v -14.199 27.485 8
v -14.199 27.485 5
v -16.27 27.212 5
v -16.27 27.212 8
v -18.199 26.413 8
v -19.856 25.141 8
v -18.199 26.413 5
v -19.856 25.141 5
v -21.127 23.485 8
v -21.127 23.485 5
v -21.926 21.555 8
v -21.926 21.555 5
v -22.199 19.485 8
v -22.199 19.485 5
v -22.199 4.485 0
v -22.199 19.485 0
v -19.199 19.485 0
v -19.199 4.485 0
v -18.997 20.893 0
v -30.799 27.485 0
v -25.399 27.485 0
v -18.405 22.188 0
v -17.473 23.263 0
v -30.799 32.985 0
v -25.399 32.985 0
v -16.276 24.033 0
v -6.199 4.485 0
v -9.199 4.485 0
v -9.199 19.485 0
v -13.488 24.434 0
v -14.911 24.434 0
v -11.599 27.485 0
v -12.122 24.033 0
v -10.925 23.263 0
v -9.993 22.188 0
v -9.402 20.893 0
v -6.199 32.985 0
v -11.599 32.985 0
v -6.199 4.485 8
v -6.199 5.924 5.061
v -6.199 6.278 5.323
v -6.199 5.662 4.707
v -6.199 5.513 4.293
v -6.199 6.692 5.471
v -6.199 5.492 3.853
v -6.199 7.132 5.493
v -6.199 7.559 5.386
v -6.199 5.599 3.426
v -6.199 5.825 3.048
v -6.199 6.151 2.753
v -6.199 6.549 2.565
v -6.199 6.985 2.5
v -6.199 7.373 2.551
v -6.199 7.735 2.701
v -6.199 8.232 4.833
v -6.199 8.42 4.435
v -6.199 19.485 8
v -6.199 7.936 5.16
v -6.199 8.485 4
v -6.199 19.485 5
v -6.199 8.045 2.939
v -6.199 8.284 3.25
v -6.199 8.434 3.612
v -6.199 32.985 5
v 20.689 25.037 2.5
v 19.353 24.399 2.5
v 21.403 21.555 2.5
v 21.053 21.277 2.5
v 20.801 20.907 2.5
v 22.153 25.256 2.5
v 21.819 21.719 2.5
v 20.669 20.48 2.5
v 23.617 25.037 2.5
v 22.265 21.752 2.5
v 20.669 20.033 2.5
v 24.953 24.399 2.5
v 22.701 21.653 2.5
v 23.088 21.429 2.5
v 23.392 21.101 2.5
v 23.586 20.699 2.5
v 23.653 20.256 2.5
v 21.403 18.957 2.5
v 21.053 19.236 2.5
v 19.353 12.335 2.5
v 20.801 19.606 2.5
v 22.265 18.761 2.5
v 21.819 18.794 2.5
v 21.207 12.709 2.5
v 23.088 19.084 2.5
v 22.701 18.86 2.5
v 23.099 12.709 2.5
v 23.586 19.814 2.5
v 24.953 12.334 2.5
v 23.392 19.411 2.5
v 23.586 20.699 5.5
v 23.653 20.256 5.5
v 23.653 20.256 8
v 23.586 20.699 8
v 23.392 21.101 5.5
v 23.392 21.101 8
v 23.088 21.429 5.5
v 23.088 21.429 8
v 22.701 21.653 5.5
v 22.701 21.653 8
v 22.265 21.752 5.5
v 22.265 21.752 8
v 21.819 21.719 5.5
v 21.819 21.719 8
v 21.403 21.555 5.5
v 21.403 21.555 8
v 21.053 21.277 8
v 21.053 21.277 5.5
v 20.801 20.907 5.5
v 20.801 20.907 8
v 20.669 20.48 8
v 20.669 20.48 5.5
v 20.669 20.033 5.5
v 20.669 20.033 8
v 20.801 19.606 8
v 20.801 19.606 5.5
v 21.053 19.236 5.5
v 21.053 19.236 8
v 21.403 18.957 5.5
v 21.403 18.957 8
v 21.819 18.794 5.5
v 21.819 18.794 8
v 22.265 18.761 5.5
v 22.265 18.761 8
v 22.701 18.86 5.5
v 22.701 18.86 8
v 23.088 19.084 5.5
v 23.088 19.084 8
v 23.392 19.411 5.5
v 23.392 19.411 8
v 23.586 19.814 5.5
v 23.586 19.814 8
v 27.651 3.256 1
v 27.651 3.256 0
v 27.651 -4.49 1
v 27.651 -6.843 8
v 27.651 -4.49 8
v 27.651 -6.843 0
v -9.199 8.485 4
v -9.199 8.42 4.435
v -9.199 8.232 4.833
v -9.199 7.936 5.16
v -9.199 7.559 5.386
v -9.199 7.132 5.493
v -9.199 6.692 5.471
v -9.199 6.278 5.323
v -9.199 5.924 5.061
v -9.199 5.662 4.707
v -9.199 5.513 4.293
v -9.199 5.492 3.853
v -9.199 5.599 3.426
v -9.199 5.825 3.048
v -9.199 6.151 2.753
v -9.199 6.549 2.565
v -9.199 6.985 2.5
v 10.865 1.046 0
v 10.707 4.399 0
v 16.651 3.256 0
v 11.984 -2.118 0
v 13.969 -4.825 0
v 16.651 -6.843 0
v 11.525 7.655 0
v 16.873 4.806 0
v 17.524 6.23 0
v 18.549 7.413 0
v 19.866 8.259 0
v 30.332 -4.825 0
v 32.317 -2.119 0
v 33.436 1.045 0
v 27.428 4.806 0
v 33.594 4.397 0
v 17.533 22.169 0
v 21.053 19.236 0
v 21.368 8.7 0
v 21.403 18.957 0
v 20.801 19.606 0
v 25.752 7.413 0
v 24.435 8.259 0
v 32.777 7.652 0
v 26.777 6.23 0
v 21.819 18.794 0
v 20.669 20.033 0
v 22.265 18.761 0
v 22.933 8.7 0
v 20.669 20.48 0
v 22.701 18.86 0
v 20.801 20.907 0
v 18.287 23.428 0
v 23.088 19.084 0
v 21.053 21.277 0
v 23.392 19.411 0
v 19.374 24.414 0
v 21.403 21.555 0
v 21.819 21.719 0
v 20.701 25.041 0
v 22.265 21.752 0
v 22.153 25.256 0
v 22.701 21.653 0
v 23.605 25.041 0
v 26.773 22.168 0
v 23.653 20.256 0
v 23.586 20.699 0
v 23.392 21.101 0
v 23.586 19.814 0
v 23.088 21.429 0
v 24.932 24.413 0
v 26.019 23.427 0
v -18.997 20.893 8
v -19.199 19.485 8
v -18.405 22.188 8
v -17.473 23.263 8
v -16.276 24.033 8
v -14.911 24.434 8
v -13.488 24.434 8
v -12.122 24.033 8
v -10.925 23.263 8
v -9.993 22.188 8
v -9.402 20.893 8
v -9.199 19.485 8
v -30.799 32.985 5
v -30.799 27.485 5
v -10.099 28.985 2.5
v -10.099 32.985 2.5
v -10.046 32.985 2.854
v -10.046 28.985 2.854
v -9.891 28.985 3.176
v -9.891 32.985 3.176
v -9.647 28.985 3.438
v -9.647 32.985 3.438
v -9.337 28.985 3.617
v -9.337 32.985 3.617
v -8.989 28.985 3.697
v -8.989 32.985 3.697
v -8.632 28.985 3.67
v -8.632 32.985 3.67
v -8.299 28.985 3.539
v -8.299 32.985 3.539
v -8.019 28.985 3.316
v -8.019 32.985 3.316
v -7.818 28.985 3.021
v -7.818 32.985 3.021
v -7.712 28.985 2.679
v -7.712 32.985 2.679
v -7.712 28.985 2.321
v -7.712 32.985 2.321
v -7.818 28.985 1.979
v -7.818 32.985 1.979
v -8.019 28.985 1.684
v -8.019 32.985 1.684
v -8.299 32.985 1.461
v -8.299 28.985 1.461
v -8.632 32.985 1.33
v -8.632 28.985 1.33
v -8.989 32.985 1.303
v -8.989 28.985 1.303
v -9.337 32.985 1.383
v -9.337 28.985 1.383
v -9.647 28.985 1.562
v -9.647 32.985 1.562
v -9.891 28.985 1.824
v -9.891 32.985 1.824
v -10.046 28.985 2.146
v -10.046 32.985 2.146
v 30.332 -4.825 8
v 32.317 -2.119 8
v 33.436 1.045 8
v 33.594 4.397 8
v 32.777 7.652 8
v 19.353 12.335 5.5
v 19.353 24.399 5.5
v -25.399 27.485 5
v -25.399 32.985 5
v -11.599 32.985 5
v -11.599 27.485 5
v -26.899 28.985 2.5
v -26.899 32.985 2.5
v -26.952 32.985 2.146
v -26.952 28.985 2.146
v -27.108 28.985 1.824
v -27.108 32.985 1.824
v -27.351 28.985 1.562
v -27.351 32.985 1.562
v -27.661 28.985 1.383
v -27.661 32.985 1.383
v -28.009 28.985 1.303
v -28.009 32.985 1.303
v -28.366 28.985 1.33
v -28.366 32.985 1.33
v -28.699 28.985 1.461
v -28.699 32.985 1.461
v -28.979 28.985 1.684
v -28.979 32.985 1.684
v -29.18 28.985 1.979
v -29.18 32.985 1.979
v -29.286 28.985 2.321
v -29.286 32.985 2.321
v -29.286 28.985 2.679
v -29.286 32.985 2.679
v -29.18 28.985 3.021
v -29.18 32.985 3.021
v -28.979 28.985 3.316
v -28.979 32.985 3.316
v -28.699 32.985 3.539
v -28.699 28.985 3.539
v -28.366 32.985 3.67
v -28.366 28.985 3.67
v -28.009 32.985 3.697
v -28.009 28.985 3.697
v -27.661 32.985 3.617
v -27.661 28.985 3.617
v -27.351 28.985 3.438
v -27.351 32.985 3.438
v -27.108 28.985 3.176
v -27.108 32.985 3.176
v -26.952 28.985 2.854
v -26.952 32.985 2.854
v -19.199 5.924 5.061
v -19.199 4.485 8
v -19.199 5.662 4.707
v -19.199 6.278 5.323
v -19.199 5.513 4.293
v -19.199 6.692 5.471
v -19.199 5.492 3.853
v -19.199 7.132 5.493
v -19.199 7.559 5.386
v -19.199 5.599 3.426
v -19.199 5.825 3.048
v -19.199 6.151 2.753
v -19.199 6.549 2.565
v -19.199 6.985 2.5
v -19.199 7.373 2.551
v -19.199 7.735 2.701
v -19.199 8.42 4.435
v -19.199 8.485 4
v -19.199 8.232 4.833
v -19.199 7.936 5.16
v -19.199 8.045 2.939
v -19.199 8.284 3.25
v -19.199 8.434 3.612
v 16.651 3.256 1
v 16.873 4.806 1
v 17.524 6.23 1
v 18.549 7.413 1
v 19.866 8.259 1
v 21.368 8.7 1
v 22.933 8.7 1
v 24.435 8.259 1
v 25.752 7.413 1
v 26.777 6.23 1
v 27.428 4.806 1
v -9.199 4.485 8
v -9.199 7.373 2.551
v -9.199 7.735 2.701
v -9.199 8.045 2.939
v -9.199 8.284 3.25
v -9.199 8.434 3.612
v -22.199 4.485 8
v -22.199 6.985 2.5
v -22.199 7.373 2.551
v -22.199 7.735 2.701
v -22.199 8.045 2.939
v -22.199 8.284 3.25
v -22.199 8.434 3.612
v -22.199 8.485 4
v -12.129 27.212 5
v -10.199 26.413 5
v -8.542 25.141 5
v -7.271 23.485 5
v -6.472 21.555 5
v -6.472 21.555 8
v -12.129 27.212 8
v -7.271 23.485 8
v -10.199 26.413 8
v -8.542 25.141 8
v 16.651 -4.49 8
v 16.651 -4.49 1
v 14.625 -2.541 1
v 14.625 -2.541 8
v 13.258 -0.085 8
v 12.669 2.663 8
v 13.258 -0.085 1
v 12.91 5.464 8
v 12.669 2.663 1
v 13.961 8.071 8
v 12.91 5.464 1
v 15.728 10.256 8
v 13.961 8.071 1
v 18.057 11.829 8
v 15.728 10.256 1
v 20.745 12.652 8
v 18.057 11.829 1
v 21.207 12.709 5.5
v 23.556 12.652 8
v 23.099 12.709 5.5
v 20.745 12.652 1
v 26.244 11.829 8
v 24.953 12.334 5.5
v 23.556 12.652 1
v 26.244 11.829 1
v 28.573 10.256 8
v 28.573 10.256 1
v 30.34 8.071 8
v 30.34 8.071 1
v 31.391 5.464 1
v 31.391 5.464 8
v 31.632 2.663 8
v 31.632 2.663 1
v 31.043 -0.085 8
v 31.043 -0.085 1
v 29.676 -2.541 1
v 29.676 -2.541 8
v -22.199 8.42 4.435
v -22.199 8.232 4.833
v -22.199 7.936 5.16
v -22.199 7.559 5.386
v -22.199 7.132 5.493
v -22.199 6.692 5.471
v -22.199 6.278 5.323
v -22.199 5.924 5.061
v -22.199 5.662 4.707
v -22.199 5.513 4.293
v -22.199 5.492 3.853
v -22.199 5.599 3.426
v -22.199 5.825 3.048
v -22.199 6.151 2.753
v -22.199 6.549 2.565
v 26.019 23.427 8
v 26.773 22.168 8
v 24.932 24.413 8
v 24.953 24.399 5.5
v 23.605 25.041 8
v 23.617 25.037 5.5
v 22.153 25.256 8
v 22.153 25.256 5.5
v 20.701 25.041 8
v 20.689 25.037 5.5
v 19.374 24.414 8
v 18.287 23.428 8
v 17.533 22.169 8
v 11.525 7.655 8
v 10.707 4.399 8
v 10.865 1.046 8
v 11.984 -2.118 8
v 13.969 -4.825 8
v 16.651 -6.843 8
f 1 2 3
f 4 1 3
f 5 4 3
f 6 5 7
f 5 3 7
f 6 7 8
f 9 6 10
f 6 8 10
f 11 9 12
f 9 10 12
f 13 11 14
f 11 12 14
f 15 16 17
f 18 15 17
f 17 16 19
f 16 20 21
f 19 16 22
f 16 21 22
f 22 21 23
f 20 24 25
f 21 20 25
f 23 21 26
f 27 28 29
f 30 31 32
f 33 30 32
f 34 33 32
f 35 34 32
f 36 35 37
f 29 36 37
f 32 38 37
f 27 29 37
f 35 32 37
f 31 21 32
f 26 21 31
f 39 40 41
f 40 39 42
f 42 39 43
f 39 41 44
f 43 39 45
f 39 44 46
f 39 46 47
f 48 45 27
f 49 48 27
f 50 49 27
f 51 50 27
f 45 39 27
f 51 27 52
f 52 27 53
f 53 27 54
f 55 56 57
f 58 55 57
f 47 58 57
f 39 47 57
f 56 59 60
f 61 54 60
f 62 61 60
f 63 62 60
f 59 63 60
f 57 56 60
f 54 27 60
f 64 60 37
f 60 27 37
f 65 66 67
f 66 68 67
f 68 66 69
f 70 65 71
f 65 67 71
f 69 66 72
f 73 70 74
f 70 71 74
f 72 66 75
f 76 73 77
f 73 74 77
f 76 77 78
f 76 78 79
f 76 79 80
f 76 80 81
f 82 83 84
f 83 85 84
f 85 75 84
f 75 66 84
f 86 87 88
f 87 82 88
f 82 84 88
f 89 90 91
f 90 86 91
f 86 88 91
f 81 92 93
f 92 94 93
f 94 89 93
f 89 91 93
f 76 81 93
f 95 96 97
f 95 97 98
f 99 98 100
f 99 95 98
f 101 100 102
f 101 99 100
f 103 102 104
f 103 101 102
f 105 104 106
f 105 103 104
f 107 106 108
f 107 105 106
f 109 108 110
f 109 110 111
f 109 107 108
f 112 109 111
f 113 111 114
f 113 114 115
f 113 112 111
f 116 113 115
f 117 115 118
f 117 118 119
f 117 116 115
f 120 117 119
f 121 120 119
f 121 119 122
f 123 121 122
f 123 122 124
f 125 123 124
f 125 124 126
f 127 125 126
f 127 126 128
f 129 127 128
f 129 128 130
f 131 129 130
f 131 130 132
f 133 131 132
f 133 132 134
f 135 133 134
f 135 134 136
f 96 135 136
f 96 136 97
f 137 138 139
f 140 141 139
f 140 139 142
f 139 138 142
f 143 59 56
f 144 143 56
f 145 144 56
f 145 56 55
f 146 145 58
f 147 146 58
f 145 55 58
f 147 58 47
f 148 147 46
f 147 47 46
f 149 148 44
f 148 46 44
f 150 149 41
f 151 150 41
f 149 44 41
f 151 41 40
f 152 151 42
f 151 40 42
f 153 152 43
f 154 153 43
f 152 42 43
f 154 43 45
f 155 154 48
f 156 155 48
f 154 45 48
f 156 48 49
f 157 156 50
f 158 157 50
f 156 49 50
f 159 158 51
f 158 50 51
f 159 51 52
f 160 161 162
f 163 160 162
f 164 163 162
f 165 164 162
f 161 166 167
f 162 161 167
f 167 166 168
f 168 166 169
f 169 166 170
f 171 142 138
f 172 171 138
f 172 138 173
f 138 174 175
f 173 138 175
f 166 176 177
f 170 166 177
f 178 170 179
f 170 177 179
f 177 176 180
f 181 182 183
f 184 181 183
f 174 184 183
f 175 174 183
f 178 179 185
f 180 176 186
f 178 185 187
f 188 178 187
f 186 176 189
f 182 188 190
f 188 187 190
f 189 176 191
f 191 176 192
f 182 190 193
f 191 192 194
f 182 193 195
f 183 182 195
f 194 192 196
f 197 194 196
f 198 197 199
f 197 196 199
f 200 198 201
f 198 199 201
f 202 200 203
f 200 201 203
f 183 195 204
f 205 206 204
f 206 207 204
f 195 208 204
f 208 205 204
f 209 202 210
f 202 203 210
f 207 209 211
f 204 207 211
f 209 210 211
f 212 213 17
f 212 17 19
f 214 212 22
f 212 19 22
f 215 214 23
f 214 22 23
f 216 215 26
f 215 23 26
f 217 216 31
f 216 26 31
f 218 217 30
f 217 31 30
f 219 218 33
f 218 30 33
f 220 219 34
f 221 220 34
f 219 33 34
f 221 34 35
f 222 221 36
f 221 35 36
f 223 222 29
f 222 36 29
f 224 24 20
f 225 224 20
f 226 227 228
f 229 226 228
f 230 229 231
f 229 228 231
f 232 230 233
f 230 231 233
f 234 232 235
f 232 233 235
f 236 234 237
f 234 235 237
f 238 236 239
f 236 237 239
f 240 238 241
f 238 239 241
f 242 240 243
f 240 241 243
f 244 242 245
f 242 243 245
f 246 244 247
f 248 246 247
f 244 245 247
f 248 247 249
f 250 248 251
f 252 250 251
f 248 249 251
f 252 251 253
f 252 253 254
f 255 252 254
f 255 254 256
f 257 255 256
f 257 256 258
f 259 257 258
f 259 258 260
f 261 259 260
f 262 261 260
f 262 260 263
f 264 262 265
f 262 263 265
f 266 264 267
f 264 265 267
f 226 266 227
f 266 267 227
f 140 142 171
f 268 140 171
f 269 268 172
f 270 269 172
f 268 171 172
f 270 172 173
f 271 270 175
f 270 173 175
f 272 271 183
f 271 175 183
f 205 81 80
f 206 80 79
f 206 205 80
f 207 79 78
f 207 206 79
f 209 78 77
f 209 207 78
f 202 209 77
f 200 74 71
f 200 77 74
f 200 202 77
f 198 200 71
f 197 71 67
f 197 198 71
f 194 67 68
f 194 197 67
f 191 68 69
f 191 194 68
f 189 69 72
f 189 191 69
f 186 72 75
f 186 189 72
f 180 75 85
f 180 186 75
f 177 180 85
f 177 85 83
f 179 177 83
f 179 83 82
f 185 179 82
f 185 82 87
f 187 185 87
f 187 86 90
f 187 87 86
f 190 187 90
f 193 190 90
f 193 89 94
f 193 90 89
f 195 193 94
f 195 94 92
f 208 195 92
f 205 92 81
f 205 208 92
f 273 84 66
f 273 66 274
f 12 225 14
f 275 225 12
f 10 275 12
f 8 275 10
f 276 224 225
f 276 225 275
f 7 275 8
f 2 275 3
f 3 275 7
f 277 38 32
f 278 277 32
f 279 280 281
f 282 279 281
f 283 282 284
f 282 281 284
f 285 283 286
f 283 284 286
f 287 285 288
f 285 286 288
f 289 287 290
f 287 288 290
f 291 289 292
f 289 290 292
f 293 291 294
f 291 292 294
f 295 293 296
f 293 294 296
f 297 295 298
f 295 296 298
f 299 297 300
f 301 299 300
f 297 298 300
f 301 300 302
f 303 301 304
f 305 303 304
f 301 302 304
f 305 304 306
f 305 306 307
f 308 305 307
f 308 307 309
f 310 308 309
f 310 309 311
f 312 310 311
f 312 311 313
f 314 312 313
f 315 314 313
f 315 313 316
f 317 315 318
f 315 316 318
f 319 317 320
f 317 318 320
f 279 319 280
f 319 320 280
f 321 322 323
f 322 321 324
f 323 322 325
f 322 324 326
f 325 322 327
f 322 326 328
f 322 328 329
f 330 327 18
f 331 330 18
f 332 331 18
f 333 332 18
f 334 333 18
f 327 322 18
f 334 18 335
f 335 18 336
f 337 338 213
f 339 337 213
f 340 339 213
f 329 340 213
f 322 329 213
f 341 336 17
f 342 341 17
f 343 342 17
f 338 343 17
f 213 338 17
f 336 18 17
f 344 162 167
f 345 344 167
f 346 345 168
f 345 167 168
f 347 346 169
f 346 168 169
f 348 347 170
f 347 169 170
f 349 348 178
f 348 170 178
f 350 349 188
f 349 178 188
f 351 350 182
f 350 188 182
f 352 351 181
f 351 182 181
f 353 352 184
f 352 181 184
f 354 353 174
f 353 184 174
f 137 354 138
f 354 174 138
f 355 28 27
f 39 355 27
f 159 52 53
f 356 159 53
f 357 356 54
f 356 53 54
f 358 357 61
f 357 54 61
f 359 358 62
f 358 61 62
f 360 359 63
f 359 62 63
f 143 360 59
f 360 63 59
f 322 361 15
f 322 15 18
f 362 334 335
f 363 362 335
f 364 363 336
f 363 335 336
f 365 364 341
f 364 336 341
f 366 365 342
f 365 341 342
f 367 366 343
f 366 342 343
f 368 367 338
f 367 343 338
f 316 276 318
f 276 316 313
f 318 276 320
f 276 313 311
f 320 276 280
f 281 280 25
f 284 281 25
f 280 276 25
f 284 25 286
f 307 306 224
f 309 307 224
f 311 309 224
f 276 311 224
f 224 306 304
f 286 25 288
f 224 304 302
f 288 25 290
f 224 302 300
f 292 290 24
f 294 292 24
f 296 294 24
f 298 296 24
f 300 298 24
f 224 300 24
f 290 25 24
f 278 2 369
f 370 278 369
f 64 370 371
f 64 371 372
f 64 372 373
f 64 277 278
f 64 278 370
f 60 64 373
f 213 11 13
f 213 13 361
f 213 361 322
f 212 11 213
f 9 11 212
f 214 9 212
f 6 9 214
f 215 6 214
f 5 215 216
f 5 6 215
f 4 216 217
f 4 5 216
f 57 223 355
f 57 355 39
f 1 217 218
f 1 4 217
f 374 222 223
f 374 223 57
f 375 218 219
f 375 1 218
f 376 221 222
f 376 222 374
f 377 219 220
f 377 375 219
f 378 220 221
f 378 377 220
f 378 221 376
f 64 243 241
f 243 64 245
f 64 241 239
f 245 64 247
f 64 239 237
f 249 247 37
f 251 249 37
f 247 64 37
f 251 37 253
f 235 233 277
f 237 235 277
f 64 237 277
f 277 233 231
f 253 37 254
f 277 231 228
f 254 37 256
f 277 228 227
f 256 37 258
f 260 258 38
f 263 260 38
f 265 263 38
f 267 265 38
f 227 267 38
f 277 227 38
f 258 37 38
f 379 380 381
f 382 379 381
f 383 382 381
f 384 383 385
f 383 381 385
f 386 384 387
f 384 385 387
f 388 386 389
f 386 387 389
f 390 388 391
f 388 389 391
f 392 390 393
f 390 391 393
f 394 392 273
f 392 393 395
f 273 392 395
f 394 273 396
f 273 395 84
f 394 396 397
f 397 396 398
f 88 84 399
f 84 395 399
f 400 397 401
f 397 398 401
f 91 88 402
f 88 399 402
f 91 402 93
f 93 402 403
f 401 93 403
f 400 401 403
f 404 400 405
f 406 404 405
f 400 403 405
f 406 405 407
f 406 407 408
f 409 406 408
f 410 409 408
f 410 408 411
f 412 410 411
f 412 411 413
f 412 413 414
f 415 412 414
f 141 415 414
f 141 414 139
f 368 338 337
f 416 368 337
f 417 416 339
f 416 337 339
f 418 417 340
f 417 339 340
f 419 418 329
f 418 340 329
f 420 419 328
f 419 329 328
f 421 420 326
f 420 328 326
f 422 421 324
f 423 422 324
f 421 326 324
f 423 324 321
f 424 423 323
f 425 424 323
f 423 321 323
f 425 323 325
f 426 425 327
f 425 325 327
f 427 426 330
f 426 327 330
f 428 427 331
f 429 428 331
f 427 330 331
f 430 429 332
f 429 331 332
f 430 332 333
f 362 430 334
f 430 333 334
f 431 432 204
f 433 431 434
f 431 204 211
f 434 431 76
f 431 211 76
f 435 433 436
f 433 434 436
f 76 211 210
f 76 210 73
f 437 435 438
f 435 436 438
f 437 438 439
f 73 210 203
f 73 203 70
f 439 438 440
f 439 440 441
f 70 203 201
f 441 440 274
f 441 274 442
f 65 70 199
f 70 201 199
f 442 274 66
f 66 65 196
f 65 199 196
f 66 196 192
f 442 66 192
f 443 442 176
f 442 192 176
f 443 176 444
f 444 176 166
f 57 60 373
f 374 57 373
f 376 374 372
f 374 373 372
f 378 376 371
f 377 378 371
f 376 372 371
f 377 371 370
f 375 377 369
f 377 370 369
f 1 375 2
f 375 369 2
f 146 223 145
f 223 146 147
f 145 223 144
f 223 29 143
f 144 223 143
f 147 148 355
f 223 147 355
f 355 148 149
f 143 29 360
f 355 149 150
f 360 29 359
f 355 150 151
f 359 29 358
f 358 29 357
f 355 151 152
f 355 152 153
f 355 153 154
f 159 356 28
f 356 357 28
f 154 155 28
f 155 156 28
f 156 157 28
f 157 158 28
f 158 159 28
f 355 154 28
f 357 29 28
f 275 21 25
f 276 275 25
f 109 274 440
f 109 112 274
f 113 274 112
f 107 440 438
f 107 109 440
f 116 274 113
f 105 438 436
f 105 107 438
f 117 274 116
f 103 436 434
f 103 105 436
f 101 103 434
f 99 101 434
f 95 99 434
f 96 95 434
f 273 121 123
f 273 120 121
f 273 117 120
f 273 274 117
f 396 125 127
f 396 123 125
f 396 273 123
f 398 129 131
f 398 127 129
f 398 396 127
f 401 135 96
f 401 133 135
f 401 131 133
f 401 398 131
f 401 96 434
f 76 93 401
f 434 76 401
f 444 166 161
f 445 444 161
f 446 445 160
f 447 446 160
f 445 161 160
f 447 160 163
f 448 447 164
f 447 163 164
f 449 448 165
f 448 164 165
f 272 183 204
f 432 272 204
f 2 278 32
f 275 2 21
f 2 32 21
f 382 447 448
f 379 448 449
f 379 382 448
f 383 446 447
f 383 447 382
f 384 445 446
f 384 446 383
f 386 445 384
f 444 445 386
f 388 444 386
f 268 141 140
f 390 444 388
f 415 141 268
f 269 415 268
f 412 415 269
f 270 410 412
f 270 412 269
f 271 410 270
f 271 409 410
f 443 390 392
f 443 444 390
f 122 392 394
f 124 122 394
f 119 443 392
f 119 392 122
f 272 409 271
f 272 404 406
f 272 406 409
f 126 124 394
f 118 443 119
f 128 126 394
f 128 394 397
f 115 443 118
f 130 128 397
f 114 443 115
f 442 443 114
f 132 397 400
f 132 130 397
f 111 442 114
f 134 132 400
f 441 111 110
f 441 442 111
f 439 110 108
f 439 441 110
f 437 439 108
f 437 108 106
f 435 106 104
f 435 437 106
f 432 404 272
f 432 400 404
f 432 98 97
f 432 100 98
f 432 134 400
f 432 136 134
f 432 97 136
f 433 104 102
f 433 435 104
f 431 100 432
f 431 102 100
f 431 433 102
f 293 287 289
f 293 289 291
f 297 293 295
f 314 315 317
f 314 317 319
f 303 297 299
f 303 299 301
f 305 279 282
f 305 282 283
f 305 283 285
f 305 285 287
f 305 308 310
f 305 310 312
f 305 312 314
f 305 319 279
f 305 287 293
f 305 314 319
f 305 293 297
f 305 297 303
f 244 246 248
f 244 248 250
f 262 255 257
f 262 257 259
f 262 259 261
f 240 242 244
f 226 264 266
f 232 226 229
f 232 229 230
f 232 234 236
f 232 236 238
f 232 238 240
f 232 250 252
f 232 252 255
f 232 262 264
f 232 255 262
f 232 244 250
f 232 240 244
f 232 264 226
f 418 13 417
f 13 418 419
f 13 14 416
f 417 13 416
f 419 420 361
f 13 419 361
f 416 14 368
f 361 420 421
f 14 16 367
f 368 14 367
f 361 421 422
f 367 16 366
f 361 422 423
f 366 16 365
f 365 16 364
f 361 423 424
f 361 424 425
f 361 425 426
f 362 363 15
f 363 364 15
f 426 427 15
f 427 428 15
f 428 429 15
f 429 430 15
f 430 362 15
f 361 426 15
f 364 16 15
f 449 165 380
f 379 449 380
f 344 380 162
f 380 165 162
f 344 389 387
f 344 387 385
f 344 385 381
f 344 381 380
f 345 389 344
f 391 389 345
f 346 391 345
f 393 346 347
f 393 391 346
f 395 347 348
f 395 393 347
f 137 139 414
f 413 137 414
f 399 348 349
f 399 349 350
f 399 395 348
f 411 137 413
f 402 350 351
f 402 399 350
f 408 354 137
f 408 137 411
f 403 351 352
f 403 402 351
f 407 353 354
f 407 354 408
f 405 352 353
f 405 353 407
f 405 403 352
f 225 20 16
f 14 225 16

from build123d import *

# Parameters (mm, degrees)
F1_DEPTH  = 8
F2_DEPTH  = 5
F3_R      = 1.2
F4_DEPTH  = 4
F6_DEPTH  = 20
F7_R      = 1.5
F8_DEPTH  = 8
F9_DEPTH  = 1
F10_W     = 5.6
F10_H     = 3
F11_DEPTH = 31.2


with BuildPart() as f1:
    # F0 (on Top) → F1 (new body)
    with BuildSketch(Plane.XY):
        with BuildLine():
            ThreePointArc((-19.1990765111, 19.4846409), (-14.1990765111, 24.4846409), (-9.1990765111, 19.4846409))
            Line((-9.1990765111, 19.4846409), (-9.1990765111, 4.4846409))
            Line((-9.1990765111, 4.4846409), (-6.1990765111, 4.4846409))
            Line((-6.1990765111, 4.4846409), (-6.1990765111, 19.4846409))
            ThreePointArc((-6.1990765111, 19.4846409), (-8.5422222616, 25.1414951495), (-14.1990765111, 27.4846409))
            ThreePointArc((-14.1990765111, 27.4846409), (-19.8559307606, 25.1414951495), (-22.1990765111, 19.4846409))
            Line((-22.1990765111, 19.4846409), (-22.1990765111, 4.4846409))
            Line((-22.1990765111, 4.4846409), (-19.1990765111, 4.4846409))
            Line((-19.1990765111, 4.4846409), (-19.1990765111, 19.4846409))
        make_face()
    extrude(amount=F1_DEPTH)

    # F0 (on Top) → F2 (join)
    with BuildSketch(Plane.XY):
        with BuildLine():
            Line((-30.7990765111, 27.4846409), (-22.1990765111, 19.4846409))
            ThreePointArc((-22.1990765111, 19.4846409), (-19.8559307606, 25.1414951495), (-14.1990765111, 27.4846409))
            Line((-14.1990765111, 27.4846409), (-25.3990765111, 27.4846409))
            Line((-25.3990765111, 27.4846409), (-25.3990765111, 32.9846409))
            Line((-25.3990765111, 32.9846409), (-28.0990765111, 32.9846409))
            Line((-28.0990765111, 32.9846409), (-30.7990765111, 32.9846409))
            Line((-30.7990765111, 32.9846409), (-30.7990765111, 27.4846409))
        make_face()
        with BuildLine():
            ThreePointArc((-14.1990765111, 27.4846409), (-8.5422222616, 25.1414951495), (-6.1990765111, 19.4846409))
            Line((-6.1990765111, 19.4846409), (-6.1990765111, 32.9846409))
            Line((-6.1990765111, 32.9846409), (-8.8990765111, 32.9846409))
            Line((-8.8990765111, 32.9846409), (-11.5990765111, 32.9846409))
            Line((-11.5990765111, 32.9846409), (-11.5990765111, 27.4846409))
            Line((-11.5990765111, 27.4846409), (-14.1990765111, 27.4846409))
        make_face()
    extrude(amount=F2_DEPTH)

    # F3 (on face) → F4 (cut)
    with BuildSketch(Plane(origin=(0, 32.9846409, 0), x_dir=(-1, 0, 0), z_dir=(0, 1, 0))):
        with Locations((8.8990765111, 2.5)):
            Circle(F3_R)
        with BuildLine():
            ThreePointArc((29.2990765111, 2.5), (28.0990765111, 3.7), (26.8990765111, 2.5))
            ThreePointArc((26.8990765111, 2.5), (28.0990765111, 1.3), (29.2990765111, 2.5))
        make_face()
    extrude(amount=-F4_DEPTH, mode=Mode.SUBTRACT)

    # F5 (on face) → F6 (cut)
    with BuildSketch(Plane.YZ.offset(-6.1990765111)):
        with BuildLine():
            ThreePointArc((6.9846409, 2.5), (8.0453010718, 2.9393398282), (8.4846409, 4))
            ThreePointArc((8.4846409, 4), (5.9239807283, 5.0606601718), (6.9846409, 2.5))
        make_face()
    extrude(amount=-F6_DEPTH, mode=Mode.SUBTRACT)


with BuildPart() as f8:
    # F7 (on Top) → F8 (new body)
    with BuildSketch(Plane.XY):
        with BuildLine():
            ThreePointArc((11.524875439, 7.6547143954), (22.151919926, 14.7563742904), (32.7772515266, 7.6521518718))
            Line((32.7772515266, 7.6521518718), (26.7728953641, 22.1675819818))
            ThreePointArc((26.7728953641, 22.1675819818), (22.1531859726, 25.2563743377), (17.5327318478, 22.1686961225))
            Line((17.5327318478, 22.1686961225), (11.524875439, 7.6547143954))
        make_face()
        with Locations((22.1525830933, 20.256374374)):
            Circle(F7_R, mode=Mode.SUBTRACT)
        with BuildLine():
            ThreePointArc((16.6505333036, -4.4895923184), (22.1505333036, 12.756374374), (27.6505333036, -4.4895923184))
            Line((27.6505333036, -4.4895923184), (27.6505333036, -6.8431305643))
            ThreePointArc((27.6505333036, -6.8431305643), (32.9923995353, -0.5781968684), (32.7772515266, 7.6521518718))
            ThreePointArc((32.7772515266, 7.6521518718), (22.151919926, 14.7563742904), (11.524875439, 7.6547143954))
            ThreePointArc((11.524875439, 7.6547143954), (11.308204794, -0.5768895732), (16.6505333036, -6.8431305643))
            Line((16.6505333036, -6.8431305643), (16.6505333036, -4.4895923184))
        make_face()
    extrude(amount=F8_DEPTH)

    # F7 (on Top) → F9 (join)
    with BuildSketch(Plane.XY):
        with BuildLine():
            Line((27.6505333036, 3.256374374), (27.6505333036, -4.4895923184))
            ThreePointArc((27.6505333036, -4.4895923184), (22.1505333036, 12.756374374), (16.6505333036, -4.4895923184))
            Line((16.6505333036, -4.4895923184), (16.6505333036, 3.256374374))
            ThreePointArc((16.6505333036, 3.256374374), (22.1505333036, 8.756374374), (27.6505333036, 3.256374374))
        make_face()
    extrude(amount=F9_DEPTH)

    # F10 (on Front) → F11 (cut)
    with BuildSketch(Plane.XZ):
        with Locations((22.1528953641, 4)):
            Rectangle(F10_W, F10_H)
    extrude(amount=-F11_DEPTH, mode=Mode.SUBTRACT)


solid = Compound([f1.part, f8.part])
